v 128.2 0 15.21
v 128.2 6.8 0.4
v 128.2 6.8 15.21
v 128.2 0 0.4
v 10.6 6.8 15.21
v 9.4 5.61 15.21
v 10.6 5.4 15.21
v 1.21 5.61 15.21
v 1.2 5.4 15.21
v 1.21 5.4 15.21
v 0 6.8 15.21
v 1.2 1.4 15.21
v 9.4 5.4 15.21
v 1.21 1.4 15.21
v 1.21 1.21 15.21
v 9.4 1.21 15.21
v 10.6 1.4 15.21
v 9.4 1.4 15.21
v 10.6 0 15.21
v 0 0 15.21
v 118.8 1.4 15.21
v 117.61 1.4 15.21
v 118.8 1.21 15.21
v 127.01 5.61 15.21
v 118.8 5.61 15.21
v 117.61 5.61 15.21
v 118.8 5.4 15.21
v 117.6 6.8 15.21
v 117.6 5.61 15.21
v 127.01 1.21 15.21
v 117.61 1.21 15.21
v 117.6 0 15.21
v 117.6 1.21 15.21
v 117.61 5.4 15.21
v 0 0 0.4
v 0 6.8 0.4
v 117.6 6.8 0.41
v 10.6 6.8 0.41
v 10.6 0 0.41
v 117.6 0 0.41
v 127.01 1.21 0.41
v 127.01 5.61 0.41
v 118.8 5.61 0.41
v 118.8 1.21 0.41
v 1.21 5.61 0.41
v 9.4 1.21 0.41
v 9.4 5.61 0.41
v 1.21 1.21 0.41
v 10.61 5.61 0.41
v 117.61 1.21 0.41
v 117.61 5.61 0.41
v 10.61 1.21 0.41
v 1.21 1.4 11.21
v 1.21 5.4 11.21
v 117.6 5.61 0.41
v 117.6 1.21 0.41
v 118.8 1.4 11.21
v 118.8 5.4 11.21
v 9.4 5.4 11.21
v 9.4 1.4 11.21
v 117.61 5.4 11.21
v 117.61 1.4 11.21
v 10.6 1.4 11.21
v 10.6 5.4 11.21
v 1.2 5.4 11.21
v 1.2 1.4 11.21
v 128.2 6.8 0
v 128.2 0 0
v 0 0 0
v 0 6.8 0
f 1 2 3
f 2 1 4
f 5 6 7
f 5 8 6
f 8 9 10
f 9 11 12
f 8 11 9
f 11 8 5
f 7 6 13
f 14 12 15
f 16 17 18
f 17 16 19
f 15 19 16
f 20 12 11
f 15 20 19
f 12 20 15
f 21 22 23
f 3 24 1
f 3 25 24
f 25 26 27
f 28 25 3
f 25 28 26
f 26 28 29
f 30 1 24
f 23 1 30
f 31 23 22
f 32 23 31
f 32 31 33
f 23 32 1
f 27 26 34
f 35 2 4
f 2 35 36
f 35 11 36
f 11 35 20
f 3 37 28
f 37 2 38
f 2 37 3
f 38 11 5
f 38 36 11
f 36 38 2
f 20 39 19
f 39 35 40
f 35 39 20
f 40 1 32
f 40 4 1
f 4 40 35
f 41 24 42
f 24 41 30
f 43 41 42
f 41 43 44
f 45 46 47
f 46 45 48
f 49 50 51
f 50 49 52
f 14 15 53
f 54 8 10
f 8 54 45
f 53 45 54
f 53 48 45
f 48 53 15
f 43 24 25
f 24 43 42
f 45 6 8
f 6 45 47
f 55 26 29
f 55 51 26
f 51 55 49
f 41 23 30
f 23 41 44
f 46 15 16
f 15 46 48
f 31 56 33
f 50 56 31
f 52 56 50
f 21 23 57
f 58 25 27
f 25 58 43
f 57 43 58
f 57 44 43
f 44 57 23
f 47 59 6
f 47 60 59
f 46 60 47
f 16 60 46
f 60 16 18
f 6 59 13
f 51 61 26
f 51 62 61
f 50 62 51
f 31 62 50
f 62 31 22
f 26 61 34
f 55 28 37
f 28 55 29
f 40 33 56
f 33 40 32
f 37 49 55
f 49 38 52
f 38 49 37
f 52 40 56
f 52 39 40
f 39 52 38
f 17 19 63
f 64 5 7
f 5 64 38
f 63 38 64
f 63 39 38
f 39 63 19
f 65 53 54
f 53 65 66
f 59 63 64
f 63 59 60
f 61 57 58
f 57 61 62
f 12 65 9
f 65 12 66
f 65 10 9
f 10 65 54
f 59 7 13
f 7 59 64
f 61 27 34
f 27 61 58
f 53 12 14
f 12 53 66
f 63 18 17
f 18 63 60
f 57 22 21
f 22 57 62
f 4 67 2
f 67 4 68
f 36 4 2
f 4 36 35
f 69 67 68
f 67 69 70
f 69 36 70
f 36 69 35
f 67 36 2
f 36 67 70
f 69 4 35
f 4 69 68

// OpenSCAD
// file: ../../Base/Rotation.scad
// Fischertechnik Box Foundation
// Geometry Helpers Rotation

include <PlacementOptions.scad>

// getRotatedSpace(space, rotation=NoRotation)
// Rotates the space dependent on the specified rotation

function getRotatedSpace(space, rotation=NoRotation) = [
    (rotation == Rotate90 || rotation == Rotate270) ? space.y : space.x,
    (rotation == Rotate90 || rotation == Rotate270) ? space.x : space.y
];

// Rotates the given space around the fixed left lower corner
// space = the space the children needs as width/depth list [width,depth]
// rotation = 0 Rotate0 degrees, 1 Rotate90 degrees, 2 Rotate180 degrees, 3 Rotate270 degrees (equivalent to -90)

module RotateFix(space, rotation=NoRotation) {
    dy = (rotation == Rotate0 || rotation == Rotate270) ? 0 :
        (rotation == Rotate90) ? space.x :
        space.y;
    dx = (rotation < Rotate180) ? 0 :
        (rotation == Rotate180) ? space.x :
        space.y;
    
    translate([dx, dy, 0])
        rotate([0, 0, rotations[rotation]])
            children();
}
// file: ../../Base/Alignment.scad
// Fischertechnik Box Foundation
// Geometry Helpers Alignment

include <PlacementOptions.scad>

// getAlignedX(elementWidth, spaceWidth, align=AlignRight, offset=0)
// Gets the aligned X offset of an element with the given
// width in the given space.
// elementWidth = The width of the element to positon
// spaceWidth = The space where the element should be aligned
// align = 0 AlignLeft, 1 AlignCenter, 2 AlignRight
// offset = an optional offset from the aligned position. When
// aligned left or centered, then positive values are in X direction.
// When aligned right then positive values are in negative X direction.

function getAlignedX(elementWidth, spaceWidth, align=AlignRight, offset=0) =
    (align == AlignLeft) ?
        offset :
        ((align == AlignCenter) ?
        (spaceWidth - elementWidth)/2 + offset :
        spaceWidth - offset - elementWidth);

// getAlignedY(elementDepth, spaceDepth, align=AlignTop, offset=0)
// Gets the aligned Y offset of an element with the given
// depth in the given space.
// elementDepth = The depth of the element to positon
// spaceDepth = The space where the element should be aligned
// align = 0 AlignBottom, 1 AlignCenter, 2 AlignTop
// offset = an optional offset from the aligned position. When
// aligned bottom or centered, then positive values are in Y direction.
// When aligned top then positive values are in negative Y direction.

function getAlignedY(elementDepth, spaceDepth, align=AlignTop, offset=0) =
    (align == AlignBottom) ?
        offset :
        ((align == AlignCenter) ?
        (spaceDepth - elementDepth)/2 + offset :
        spaceDepth - offset - elementDepth);
// file: ../../Base/Boxes.scad
// Fischertechnik Box Foundation
// Pre-designed Boxes

use <Constants.scad>

include <PlacementOptions.scad>

box190Width = 190;
box190Depth = 130;
box130Width = 130;
box130Depth = 95;

// Values are from an original ec3 box
topBottomDifference = 1.5;
outerHeight = 40;
innerHeight = 38.2;
baseThickness = outerHeight - innerHeight;
stackExcess = 5.7;
radius = 3.5;
wallThickness = 1.5;
tolerance = 0.2;
stackOffset = innerHeight - stackExcess;

boxUsageHeight = stackOffset;
boxWallThickness = wallThickness;
boxBaseThickness = baseThickness;
boxWebWidth = 3.0;

// getBoxWallThickness()
// Gets the wall thickness of a Fischertechnik Box
function getBoxWallThickness() = boxWallThickness;

// getBoxUsageHeight()
// Gets the usable height of a Fischertechnik box
function getBoxUsageHeight() = boxUsageHeight;

// getBoxInnerHeight()
// Gets the inner height of a Fischertechnik box, including the stack excess
function getBoxInnerHeight() = innerHeight;

// getBoxBaseThickness()
// Gets the thickness of the Fischertechnik box base.
function getBoxBaseThickness() = boxBaseThickness;

// getBoxWebWidth()
// Gets the width of a box web
function getBoxWebWidth() = boxWebWidth;

// getBox190Space()
// Gets the usable inner space of a Box 190 as an x/y-list
function getBox190Space() = [
    box190Width - 2*getBoxWallThickness() - topBottomDifference, 
    box190Depth - 2*getBoxWallThickness() - topBottomDifference ];

// BoxBase(width, depth)
// Creates an empty stackable Fischertechnik compatible box
// width = Outer width of the box (190, 130, ...)
// depth = Outer depth of the box (130, 95, ...)

module BoxBase(width, depth, height=outerHeight) {    
    thinPlate = 0.01;

    innerHeight = height - baseThickness;    
    
    module BodyPlate(width, depth) {
        translate([radius, radius])
        hull() {
            w = width-2*radius;
            d = depth-2*radius;
            cube([w, d, thinPlate]);
            cylinder(thinPlate, r=radius, $fn=getFragments());
            translate([w, 0])
                cylinder(thinPlate, r=radius, $fn=getFragments());
            translate([w, d])
                cylinder(thinPlate, r=radius, $fn=getFragments());
            translate([0, d])
                cylinder(thinPlate, r=radius, $fn=getFragments());
        }
    }
    
    module Body(tolerance=tolerance) {
        hull() {
            // Bottom with tolerance to fit into the original boxes when stacked
            translate([-wallThickness+tolerance, -wallThickness+tolerance, -baseThickness])
                BodyPlate(width-topBottomDifference-2*tolerance, depth-topBottomDifference-2*tolerance);
            
            // Top
            translate([-wallThickness-topBottomDifference/2, -wallThickness-topBottomDifference/2, innerHeight-thinPlate])
                BodyPlate(width, depth);
         }
    }

    module Cutoff() {
        hull() {
            coWidth = width - 2*wallThickness;
            coDepth = depth - 2*wallThickness;
            
            // Bottom
            BodyPlate(coWidth-topBottomDifference, coDepth-topBottomDifference);

            // Top
            translate([-topBottomDifference/2, -topBottomDifference/2, innerHeight+thinPlate]) 
                BodyPlate(coWidth, coDepth);
        }
    }
    
    difference() {        
        Body();
        Cutoff();
        stackOffset = innerHeight - stackExcess;
        translate([0, 0, stackOffset + baseThickness])
            Body(tolerance=0);
    }
}

// Creates the Fischertechnik empty box 130x190 mm and places it at position 0,0
// 190x130 are the outer sizes, the inner space is slightly smaller. Use getBox190Space() to get the inner sizes.
// The box is positioned that the usable inner space is at the 0,0,0 position. The

module Box190() {
    BoxBase(box190Width, box190Depth);
}

// Gets the usable inner space of a Box 130 as an x/y-list
function getBox130Space() = [
    box130Width - 2*getBoxWallThickness() - topBottomDifference, 
    box130Depth - 2*getBoxWallThickness() - topBottomDifference ];

// Creates the Fischertechnik empty box 95x130 mm and places it at position 0,0
// 190x130 are the outer sizes, the inner space is slightly smaller. Use getBox190Space() to get the inner sizes.
// The box is positioned that the usable inner space is at the 0,0,0 position. The

module Box130() {
    BoxBase(box130Width, box130Depth);
}

// Creates a web at the specified box walls
// corner 0 = LowerLeft, 1 = UpperLeft, 2 = UpperRight, 3 = LowerRight
// side 0 = LeftOfCorner, 1 = RightOfCorner
// distance = Distance in mm from the corner
// boxSpace = inner width and depth of the box (default: Box 190)
// webWidth = length of the web (default is 3 mms)
// webThickness = thickness of the web (default is 1 mm)

module BoxWeb(corner, side, distance, boxSpace=getBox190Space(), webWidth=getBoxWebWidth(), webThickness=1.0) {
    sink = getBoxWallThickness()/2;

    width = (corner % 2 == 0) ? 
            (side == LeftOfCorner ? webWidth : webThickness) :
            (side == LeftOfCorner ? webThickness : webWidth);

    depth = (corner % 2 == 0) ? 
            (side == RightOfCorner ? webWidth : webThickness) :
            (side == RightOfCorner ? webThickness : webWidth);
    
    xDiff = corner == LowerLeft ? 
                (side == LeftOfCorner ? -sink : distance) :
            (corner == UpperLeft ?                
                (side == LeftOfCorner ? distance : -sink) :
            (corner == UpperRight ?
                (side == LeftOfCorner ? boxSpace.x-webWidth+sink : boxSpace.x-distance-webThickness) :
                (side == LeftOfCorner ? boxSpace.x-distance-webThickness: boxSpace.x-webWidth+sink)));

    yDiff = corner == LowerLeft ? 
                (side == RightOfCorner ? -sink : distance) :
            (corner == UpperLeft ?
                (side == RightOfCorner ? boxSpace.y-distance : boxSpace.y-webWidth+sink) :
            (corner == UpperRight ?
                (side == RightOfCorner ? boxSpace.y-webWidth+sink : boxSpace.y-distance) :
                (side == RightOfCorner ? distance : -sink)));
    
    translate([xDiff, yDiff, -getExcess()])
        cube([width, depth, boxUsageHeight + 2*getExcess()]);
}
// file: ../../Base/PlacementOptions.scad
// Fischertechnik Box Foundation
// Placement Options

// Alignment
NoAlign = 0;
AlignLeft = 1;
AlignBottom = 2;
AlignCenter = 3;
AlignRight = 4;
AlignTop = 5;

// Element rotation degree steps
rotations = [0, -90, -180, -270];

// Rotation
NoRotation = 0;
Rotate0 = 0;
Rotate90 = 1;
Rotate180 = 2;
Rotate270 = 3;

// Docking (seen from above)
NoDock = -1;
DockLeft = 0;
DockTop = 1;
DockRight = 2;
DockCorner = 2;
DockBottom = 3;

// Web corners
LowerLeft = 0;
UpperLeft = 1;
UpperRight = 2;
LowerRight = 3;

// Web position relative to corner
LeftOfCorner = 0;
RightOfCorner = 1;
// file: ../../Base/Placement.scad
// Fischertechnik Box Foundation
// Geometry Helpers Placement

use <Constants.scad>
use <Alignment.scad>
use <Rotation.scad>
use <Boxes.scad>

include <PlacementOptions.scad>

// Place(x=0, y=0, elementSpace=[0,0], alignX=AlignLeft, alignY=AlignBottom, rotation=Rotate0, boxSpace=getBox190Space())
// Places the child at the specified position
// y = Y-Position. This is a relative position when an X aligment is specified.
// x = X-Position. This is a relative position when an Y aligment is specified.
// elementSpace = space of the element to be placed [x,y]
// alignX = -1=NoAlign, 0 AlignLeft, 1 AlignCenter, 3 AlignRight (elementSpace and boxSpace required!)
// alignY = -1=NoAlign, 2 AlignBottom, 1 AlignCenter, 4 AlignTop (elementSpace and boxSpace required!)
// rotation = 0 Rotate0 0 degrees, 1 Rotate90 90 degrees, 
// 2 Rotate180 180 degrees, 3 Rotate270 270 degrees (equivalent to -90)
// boxSpace = Inner space of the box where the placement occurs [x,y] - default is Box 190x130 inner space

module Place(x=0, y=0, elementSpace=[0,0], 
  alignX=AlignLeft, alignY=AlignBottom, 
  rotation=NoRotation, boxSpace=getBox190Space()) {

    module Position(x, y, space, rotation=Rotate0) {
        translate([x, y, 0])
            RotateFix(space, rotation)
                children();
    }

    space = getRotatedSpace(elementSpace, rotation);
    alignedX = getAlignedX(space.x, boxSpace.x, alignX, x);
    alignedY = getAlignedY(space.y, boxSpace.y, alignY, y);
    Position(alignedX, alignedY, elementSpace, rotation)
        children();
}

// Center(space=getBox130Space(), elementSpace=[0,0])
// space = Space where the children is centered. For cylinder use centered=true and no elementSpace.
// elementSpace = space of the element to be centered [x,y]

module Center(space=getBox190Space(), elementSpace=[0,0]) {
    Place(elementSpace=elementSpace, boxSpace=space, alignX=AlignCenter, alignY=AlignCenter)
        children();
}

// CenterHorizontal(width=0, y=0, offset=0, space=getBox130Space())
// width = Width of the element to be placed.
// y = Y position of the element
// offset = Offset from the center position (negative will be left of the center)
// space = Space where the element is placed

module CenterHorizontal(width=0, y=0, offset=0, space=getBox190Space()) {
    Place(x=offset, y=y, elementSpace=[width, 0], boxSpace=space, alignX=AlignCenter)
        children(0);
}

// CenterVertical(depth=0, x=0, offset=0, space=getBox130Space())
// depth = Depth of the element to be placed.
// x = X position of the element
// offset = Offset from the center position (negative will be down of the center)
// space = Space where the element is placed

module CenterVertical(depth=0, x=0, offset=0, space=getBox190Space()) {
    Place(x=x, y=offset, elementSpace=[0, depth], boxSpace=space, alignY=AlignCenter)
        children(0);
}

// getIsVertical(align)
// True if the specified alignment needs a vertical orientation for a divider (AlignRight, AlignLeft)

function getIsVertical(align) = (align == AlignRight || align == AlignLeft);

// getIsHorizontal(align)
// True if the specified alignment needs a horizontal orientation for a divider (AlignTop, AlignBottom)

function getIsHorizontal(align) = (align == AlignTop || align == AlignBottom);
// file: ../../Elements/AxisClip10.scad
// Fischertechnik Box Library
// Axis for clip 10
// 31023

use <../ModelBase/Simple.scad>
use <../Base/Constants.scad>

width = 12;
depth = 12;
height = 23;
upperDiameter = 3.6;
clipHeight = 10;

// getAxisClip10Space()
// Gets the space of a frame for a clip 10 with spring ring (mot2)

function getAxisClip10Space() = [width, depth, height];

// AxisClip10(height, clipHeight)
// Axis for clip 10 with spring ring (mot2)
// height = Height of the complete axis
// clipHeight = Height of the rt for the clip (standard is 10, in mot3 its only 7)

module AxisClip10(height=height, clipHeight=clipHeight) {
    LeveledAxisWithSpace(height, height-clipHeight, getAxisClip10Space(), diameter=upperDiameter);
}

// Tests
color("lightgray")
AxisClip10();
// file: ../../Base/Constants.scad
// Fischertechnik Box Foundation
// Constants

// Constant values necessary for multiple elements

// Base constants
dividerThickness = 1.2;
excess = 0.01;
fragments = 90;
tolerance = 0.8;

// Gets the thickness of a divider 
function getDividerThickness() = dividerThickness;

// Gets the excess that is used to merge walls into each other
function getExcess() = excess;

// Gets amount of fragments of a cylinder
function getFragments() = fragments;

// Gets the inner tolerance of a frame to each side
function getTolerance() = tolerance;


// Fischertechnik specific constants
axisDiameter = 4;
axisBottomDiameter = axisDiameter + 1;
standardEdgeDistance = 2.5;
standardWebDistance = 11.5;
standardCornerLength = 15;
tubeWallFactor = 0.8;
smallPartsFrameHeight = 20;

// Gets axis diameter
function getAxisDiameter() = axisDiameter;

// Gets axis bottom diameter for thicker part at the bottom
function getAxisBottomDiameter() = axisBottomDiameter;

// gets the standard distance to the wall of the box for dockable frames with webs
function getStandardEdgeDistance() = standardEdgeDistance;

// gets the standard distance of each web to the corner of the dockable frame
function getStandardWebDistance() = standardWebDistance;

// gets the standard length of the corner walls of a dockable frame
function getStandardCornerLength() = standardCornerLength;

// gets the wall thickness of a tube.
function getTubeWallThickness() = tubeWallFactor * getDividerThickness();

// gets the frame height for docked small parts boxes.
function getSmallPartsFrameHeight() = smallPartsFrameHeight;
// file: ../../Elements/FrameAxis125.scad
// Fischertechnik Box Library
// Frame for single 125 mm Axis
// 31036

use <../ModelBase/Complex.scad>

length = 125;

// getFrameAxis125Space()
// Gets the width (.x) and depth (.y) of the axis frame.

function getFrameAxis125Space() = getFrameAxisSpace(length);

// FrameAxis125()
// Axis holder for a single 125 mm axis.

module FrameAxis125() {
    FrameAxis(length);
}

// Test
color("lightgray")
FrameAxis125();
// file: ../TestPrint.scad
// 3D Print Test Base

use <../Base/Constants.scad>

use <../Elements/AxisClip10.scad>

module TestPrint(elementSpace) {
    cube([elementSpace.x, elementSpace.y, 0.4]);
    translate([0,0,0.4+getExcess()]) {
        children();
    }
}

TestPrint(getAxisClip10Space())
    AxisClip10();
// main file
// 3D Print Test
// FrameAxis125

use <../TestPrint.scad>
use <../../Elements/FrameAxis125.scad>

TestPrint(getFrameAxis125Space())
    FrameAxis125();
